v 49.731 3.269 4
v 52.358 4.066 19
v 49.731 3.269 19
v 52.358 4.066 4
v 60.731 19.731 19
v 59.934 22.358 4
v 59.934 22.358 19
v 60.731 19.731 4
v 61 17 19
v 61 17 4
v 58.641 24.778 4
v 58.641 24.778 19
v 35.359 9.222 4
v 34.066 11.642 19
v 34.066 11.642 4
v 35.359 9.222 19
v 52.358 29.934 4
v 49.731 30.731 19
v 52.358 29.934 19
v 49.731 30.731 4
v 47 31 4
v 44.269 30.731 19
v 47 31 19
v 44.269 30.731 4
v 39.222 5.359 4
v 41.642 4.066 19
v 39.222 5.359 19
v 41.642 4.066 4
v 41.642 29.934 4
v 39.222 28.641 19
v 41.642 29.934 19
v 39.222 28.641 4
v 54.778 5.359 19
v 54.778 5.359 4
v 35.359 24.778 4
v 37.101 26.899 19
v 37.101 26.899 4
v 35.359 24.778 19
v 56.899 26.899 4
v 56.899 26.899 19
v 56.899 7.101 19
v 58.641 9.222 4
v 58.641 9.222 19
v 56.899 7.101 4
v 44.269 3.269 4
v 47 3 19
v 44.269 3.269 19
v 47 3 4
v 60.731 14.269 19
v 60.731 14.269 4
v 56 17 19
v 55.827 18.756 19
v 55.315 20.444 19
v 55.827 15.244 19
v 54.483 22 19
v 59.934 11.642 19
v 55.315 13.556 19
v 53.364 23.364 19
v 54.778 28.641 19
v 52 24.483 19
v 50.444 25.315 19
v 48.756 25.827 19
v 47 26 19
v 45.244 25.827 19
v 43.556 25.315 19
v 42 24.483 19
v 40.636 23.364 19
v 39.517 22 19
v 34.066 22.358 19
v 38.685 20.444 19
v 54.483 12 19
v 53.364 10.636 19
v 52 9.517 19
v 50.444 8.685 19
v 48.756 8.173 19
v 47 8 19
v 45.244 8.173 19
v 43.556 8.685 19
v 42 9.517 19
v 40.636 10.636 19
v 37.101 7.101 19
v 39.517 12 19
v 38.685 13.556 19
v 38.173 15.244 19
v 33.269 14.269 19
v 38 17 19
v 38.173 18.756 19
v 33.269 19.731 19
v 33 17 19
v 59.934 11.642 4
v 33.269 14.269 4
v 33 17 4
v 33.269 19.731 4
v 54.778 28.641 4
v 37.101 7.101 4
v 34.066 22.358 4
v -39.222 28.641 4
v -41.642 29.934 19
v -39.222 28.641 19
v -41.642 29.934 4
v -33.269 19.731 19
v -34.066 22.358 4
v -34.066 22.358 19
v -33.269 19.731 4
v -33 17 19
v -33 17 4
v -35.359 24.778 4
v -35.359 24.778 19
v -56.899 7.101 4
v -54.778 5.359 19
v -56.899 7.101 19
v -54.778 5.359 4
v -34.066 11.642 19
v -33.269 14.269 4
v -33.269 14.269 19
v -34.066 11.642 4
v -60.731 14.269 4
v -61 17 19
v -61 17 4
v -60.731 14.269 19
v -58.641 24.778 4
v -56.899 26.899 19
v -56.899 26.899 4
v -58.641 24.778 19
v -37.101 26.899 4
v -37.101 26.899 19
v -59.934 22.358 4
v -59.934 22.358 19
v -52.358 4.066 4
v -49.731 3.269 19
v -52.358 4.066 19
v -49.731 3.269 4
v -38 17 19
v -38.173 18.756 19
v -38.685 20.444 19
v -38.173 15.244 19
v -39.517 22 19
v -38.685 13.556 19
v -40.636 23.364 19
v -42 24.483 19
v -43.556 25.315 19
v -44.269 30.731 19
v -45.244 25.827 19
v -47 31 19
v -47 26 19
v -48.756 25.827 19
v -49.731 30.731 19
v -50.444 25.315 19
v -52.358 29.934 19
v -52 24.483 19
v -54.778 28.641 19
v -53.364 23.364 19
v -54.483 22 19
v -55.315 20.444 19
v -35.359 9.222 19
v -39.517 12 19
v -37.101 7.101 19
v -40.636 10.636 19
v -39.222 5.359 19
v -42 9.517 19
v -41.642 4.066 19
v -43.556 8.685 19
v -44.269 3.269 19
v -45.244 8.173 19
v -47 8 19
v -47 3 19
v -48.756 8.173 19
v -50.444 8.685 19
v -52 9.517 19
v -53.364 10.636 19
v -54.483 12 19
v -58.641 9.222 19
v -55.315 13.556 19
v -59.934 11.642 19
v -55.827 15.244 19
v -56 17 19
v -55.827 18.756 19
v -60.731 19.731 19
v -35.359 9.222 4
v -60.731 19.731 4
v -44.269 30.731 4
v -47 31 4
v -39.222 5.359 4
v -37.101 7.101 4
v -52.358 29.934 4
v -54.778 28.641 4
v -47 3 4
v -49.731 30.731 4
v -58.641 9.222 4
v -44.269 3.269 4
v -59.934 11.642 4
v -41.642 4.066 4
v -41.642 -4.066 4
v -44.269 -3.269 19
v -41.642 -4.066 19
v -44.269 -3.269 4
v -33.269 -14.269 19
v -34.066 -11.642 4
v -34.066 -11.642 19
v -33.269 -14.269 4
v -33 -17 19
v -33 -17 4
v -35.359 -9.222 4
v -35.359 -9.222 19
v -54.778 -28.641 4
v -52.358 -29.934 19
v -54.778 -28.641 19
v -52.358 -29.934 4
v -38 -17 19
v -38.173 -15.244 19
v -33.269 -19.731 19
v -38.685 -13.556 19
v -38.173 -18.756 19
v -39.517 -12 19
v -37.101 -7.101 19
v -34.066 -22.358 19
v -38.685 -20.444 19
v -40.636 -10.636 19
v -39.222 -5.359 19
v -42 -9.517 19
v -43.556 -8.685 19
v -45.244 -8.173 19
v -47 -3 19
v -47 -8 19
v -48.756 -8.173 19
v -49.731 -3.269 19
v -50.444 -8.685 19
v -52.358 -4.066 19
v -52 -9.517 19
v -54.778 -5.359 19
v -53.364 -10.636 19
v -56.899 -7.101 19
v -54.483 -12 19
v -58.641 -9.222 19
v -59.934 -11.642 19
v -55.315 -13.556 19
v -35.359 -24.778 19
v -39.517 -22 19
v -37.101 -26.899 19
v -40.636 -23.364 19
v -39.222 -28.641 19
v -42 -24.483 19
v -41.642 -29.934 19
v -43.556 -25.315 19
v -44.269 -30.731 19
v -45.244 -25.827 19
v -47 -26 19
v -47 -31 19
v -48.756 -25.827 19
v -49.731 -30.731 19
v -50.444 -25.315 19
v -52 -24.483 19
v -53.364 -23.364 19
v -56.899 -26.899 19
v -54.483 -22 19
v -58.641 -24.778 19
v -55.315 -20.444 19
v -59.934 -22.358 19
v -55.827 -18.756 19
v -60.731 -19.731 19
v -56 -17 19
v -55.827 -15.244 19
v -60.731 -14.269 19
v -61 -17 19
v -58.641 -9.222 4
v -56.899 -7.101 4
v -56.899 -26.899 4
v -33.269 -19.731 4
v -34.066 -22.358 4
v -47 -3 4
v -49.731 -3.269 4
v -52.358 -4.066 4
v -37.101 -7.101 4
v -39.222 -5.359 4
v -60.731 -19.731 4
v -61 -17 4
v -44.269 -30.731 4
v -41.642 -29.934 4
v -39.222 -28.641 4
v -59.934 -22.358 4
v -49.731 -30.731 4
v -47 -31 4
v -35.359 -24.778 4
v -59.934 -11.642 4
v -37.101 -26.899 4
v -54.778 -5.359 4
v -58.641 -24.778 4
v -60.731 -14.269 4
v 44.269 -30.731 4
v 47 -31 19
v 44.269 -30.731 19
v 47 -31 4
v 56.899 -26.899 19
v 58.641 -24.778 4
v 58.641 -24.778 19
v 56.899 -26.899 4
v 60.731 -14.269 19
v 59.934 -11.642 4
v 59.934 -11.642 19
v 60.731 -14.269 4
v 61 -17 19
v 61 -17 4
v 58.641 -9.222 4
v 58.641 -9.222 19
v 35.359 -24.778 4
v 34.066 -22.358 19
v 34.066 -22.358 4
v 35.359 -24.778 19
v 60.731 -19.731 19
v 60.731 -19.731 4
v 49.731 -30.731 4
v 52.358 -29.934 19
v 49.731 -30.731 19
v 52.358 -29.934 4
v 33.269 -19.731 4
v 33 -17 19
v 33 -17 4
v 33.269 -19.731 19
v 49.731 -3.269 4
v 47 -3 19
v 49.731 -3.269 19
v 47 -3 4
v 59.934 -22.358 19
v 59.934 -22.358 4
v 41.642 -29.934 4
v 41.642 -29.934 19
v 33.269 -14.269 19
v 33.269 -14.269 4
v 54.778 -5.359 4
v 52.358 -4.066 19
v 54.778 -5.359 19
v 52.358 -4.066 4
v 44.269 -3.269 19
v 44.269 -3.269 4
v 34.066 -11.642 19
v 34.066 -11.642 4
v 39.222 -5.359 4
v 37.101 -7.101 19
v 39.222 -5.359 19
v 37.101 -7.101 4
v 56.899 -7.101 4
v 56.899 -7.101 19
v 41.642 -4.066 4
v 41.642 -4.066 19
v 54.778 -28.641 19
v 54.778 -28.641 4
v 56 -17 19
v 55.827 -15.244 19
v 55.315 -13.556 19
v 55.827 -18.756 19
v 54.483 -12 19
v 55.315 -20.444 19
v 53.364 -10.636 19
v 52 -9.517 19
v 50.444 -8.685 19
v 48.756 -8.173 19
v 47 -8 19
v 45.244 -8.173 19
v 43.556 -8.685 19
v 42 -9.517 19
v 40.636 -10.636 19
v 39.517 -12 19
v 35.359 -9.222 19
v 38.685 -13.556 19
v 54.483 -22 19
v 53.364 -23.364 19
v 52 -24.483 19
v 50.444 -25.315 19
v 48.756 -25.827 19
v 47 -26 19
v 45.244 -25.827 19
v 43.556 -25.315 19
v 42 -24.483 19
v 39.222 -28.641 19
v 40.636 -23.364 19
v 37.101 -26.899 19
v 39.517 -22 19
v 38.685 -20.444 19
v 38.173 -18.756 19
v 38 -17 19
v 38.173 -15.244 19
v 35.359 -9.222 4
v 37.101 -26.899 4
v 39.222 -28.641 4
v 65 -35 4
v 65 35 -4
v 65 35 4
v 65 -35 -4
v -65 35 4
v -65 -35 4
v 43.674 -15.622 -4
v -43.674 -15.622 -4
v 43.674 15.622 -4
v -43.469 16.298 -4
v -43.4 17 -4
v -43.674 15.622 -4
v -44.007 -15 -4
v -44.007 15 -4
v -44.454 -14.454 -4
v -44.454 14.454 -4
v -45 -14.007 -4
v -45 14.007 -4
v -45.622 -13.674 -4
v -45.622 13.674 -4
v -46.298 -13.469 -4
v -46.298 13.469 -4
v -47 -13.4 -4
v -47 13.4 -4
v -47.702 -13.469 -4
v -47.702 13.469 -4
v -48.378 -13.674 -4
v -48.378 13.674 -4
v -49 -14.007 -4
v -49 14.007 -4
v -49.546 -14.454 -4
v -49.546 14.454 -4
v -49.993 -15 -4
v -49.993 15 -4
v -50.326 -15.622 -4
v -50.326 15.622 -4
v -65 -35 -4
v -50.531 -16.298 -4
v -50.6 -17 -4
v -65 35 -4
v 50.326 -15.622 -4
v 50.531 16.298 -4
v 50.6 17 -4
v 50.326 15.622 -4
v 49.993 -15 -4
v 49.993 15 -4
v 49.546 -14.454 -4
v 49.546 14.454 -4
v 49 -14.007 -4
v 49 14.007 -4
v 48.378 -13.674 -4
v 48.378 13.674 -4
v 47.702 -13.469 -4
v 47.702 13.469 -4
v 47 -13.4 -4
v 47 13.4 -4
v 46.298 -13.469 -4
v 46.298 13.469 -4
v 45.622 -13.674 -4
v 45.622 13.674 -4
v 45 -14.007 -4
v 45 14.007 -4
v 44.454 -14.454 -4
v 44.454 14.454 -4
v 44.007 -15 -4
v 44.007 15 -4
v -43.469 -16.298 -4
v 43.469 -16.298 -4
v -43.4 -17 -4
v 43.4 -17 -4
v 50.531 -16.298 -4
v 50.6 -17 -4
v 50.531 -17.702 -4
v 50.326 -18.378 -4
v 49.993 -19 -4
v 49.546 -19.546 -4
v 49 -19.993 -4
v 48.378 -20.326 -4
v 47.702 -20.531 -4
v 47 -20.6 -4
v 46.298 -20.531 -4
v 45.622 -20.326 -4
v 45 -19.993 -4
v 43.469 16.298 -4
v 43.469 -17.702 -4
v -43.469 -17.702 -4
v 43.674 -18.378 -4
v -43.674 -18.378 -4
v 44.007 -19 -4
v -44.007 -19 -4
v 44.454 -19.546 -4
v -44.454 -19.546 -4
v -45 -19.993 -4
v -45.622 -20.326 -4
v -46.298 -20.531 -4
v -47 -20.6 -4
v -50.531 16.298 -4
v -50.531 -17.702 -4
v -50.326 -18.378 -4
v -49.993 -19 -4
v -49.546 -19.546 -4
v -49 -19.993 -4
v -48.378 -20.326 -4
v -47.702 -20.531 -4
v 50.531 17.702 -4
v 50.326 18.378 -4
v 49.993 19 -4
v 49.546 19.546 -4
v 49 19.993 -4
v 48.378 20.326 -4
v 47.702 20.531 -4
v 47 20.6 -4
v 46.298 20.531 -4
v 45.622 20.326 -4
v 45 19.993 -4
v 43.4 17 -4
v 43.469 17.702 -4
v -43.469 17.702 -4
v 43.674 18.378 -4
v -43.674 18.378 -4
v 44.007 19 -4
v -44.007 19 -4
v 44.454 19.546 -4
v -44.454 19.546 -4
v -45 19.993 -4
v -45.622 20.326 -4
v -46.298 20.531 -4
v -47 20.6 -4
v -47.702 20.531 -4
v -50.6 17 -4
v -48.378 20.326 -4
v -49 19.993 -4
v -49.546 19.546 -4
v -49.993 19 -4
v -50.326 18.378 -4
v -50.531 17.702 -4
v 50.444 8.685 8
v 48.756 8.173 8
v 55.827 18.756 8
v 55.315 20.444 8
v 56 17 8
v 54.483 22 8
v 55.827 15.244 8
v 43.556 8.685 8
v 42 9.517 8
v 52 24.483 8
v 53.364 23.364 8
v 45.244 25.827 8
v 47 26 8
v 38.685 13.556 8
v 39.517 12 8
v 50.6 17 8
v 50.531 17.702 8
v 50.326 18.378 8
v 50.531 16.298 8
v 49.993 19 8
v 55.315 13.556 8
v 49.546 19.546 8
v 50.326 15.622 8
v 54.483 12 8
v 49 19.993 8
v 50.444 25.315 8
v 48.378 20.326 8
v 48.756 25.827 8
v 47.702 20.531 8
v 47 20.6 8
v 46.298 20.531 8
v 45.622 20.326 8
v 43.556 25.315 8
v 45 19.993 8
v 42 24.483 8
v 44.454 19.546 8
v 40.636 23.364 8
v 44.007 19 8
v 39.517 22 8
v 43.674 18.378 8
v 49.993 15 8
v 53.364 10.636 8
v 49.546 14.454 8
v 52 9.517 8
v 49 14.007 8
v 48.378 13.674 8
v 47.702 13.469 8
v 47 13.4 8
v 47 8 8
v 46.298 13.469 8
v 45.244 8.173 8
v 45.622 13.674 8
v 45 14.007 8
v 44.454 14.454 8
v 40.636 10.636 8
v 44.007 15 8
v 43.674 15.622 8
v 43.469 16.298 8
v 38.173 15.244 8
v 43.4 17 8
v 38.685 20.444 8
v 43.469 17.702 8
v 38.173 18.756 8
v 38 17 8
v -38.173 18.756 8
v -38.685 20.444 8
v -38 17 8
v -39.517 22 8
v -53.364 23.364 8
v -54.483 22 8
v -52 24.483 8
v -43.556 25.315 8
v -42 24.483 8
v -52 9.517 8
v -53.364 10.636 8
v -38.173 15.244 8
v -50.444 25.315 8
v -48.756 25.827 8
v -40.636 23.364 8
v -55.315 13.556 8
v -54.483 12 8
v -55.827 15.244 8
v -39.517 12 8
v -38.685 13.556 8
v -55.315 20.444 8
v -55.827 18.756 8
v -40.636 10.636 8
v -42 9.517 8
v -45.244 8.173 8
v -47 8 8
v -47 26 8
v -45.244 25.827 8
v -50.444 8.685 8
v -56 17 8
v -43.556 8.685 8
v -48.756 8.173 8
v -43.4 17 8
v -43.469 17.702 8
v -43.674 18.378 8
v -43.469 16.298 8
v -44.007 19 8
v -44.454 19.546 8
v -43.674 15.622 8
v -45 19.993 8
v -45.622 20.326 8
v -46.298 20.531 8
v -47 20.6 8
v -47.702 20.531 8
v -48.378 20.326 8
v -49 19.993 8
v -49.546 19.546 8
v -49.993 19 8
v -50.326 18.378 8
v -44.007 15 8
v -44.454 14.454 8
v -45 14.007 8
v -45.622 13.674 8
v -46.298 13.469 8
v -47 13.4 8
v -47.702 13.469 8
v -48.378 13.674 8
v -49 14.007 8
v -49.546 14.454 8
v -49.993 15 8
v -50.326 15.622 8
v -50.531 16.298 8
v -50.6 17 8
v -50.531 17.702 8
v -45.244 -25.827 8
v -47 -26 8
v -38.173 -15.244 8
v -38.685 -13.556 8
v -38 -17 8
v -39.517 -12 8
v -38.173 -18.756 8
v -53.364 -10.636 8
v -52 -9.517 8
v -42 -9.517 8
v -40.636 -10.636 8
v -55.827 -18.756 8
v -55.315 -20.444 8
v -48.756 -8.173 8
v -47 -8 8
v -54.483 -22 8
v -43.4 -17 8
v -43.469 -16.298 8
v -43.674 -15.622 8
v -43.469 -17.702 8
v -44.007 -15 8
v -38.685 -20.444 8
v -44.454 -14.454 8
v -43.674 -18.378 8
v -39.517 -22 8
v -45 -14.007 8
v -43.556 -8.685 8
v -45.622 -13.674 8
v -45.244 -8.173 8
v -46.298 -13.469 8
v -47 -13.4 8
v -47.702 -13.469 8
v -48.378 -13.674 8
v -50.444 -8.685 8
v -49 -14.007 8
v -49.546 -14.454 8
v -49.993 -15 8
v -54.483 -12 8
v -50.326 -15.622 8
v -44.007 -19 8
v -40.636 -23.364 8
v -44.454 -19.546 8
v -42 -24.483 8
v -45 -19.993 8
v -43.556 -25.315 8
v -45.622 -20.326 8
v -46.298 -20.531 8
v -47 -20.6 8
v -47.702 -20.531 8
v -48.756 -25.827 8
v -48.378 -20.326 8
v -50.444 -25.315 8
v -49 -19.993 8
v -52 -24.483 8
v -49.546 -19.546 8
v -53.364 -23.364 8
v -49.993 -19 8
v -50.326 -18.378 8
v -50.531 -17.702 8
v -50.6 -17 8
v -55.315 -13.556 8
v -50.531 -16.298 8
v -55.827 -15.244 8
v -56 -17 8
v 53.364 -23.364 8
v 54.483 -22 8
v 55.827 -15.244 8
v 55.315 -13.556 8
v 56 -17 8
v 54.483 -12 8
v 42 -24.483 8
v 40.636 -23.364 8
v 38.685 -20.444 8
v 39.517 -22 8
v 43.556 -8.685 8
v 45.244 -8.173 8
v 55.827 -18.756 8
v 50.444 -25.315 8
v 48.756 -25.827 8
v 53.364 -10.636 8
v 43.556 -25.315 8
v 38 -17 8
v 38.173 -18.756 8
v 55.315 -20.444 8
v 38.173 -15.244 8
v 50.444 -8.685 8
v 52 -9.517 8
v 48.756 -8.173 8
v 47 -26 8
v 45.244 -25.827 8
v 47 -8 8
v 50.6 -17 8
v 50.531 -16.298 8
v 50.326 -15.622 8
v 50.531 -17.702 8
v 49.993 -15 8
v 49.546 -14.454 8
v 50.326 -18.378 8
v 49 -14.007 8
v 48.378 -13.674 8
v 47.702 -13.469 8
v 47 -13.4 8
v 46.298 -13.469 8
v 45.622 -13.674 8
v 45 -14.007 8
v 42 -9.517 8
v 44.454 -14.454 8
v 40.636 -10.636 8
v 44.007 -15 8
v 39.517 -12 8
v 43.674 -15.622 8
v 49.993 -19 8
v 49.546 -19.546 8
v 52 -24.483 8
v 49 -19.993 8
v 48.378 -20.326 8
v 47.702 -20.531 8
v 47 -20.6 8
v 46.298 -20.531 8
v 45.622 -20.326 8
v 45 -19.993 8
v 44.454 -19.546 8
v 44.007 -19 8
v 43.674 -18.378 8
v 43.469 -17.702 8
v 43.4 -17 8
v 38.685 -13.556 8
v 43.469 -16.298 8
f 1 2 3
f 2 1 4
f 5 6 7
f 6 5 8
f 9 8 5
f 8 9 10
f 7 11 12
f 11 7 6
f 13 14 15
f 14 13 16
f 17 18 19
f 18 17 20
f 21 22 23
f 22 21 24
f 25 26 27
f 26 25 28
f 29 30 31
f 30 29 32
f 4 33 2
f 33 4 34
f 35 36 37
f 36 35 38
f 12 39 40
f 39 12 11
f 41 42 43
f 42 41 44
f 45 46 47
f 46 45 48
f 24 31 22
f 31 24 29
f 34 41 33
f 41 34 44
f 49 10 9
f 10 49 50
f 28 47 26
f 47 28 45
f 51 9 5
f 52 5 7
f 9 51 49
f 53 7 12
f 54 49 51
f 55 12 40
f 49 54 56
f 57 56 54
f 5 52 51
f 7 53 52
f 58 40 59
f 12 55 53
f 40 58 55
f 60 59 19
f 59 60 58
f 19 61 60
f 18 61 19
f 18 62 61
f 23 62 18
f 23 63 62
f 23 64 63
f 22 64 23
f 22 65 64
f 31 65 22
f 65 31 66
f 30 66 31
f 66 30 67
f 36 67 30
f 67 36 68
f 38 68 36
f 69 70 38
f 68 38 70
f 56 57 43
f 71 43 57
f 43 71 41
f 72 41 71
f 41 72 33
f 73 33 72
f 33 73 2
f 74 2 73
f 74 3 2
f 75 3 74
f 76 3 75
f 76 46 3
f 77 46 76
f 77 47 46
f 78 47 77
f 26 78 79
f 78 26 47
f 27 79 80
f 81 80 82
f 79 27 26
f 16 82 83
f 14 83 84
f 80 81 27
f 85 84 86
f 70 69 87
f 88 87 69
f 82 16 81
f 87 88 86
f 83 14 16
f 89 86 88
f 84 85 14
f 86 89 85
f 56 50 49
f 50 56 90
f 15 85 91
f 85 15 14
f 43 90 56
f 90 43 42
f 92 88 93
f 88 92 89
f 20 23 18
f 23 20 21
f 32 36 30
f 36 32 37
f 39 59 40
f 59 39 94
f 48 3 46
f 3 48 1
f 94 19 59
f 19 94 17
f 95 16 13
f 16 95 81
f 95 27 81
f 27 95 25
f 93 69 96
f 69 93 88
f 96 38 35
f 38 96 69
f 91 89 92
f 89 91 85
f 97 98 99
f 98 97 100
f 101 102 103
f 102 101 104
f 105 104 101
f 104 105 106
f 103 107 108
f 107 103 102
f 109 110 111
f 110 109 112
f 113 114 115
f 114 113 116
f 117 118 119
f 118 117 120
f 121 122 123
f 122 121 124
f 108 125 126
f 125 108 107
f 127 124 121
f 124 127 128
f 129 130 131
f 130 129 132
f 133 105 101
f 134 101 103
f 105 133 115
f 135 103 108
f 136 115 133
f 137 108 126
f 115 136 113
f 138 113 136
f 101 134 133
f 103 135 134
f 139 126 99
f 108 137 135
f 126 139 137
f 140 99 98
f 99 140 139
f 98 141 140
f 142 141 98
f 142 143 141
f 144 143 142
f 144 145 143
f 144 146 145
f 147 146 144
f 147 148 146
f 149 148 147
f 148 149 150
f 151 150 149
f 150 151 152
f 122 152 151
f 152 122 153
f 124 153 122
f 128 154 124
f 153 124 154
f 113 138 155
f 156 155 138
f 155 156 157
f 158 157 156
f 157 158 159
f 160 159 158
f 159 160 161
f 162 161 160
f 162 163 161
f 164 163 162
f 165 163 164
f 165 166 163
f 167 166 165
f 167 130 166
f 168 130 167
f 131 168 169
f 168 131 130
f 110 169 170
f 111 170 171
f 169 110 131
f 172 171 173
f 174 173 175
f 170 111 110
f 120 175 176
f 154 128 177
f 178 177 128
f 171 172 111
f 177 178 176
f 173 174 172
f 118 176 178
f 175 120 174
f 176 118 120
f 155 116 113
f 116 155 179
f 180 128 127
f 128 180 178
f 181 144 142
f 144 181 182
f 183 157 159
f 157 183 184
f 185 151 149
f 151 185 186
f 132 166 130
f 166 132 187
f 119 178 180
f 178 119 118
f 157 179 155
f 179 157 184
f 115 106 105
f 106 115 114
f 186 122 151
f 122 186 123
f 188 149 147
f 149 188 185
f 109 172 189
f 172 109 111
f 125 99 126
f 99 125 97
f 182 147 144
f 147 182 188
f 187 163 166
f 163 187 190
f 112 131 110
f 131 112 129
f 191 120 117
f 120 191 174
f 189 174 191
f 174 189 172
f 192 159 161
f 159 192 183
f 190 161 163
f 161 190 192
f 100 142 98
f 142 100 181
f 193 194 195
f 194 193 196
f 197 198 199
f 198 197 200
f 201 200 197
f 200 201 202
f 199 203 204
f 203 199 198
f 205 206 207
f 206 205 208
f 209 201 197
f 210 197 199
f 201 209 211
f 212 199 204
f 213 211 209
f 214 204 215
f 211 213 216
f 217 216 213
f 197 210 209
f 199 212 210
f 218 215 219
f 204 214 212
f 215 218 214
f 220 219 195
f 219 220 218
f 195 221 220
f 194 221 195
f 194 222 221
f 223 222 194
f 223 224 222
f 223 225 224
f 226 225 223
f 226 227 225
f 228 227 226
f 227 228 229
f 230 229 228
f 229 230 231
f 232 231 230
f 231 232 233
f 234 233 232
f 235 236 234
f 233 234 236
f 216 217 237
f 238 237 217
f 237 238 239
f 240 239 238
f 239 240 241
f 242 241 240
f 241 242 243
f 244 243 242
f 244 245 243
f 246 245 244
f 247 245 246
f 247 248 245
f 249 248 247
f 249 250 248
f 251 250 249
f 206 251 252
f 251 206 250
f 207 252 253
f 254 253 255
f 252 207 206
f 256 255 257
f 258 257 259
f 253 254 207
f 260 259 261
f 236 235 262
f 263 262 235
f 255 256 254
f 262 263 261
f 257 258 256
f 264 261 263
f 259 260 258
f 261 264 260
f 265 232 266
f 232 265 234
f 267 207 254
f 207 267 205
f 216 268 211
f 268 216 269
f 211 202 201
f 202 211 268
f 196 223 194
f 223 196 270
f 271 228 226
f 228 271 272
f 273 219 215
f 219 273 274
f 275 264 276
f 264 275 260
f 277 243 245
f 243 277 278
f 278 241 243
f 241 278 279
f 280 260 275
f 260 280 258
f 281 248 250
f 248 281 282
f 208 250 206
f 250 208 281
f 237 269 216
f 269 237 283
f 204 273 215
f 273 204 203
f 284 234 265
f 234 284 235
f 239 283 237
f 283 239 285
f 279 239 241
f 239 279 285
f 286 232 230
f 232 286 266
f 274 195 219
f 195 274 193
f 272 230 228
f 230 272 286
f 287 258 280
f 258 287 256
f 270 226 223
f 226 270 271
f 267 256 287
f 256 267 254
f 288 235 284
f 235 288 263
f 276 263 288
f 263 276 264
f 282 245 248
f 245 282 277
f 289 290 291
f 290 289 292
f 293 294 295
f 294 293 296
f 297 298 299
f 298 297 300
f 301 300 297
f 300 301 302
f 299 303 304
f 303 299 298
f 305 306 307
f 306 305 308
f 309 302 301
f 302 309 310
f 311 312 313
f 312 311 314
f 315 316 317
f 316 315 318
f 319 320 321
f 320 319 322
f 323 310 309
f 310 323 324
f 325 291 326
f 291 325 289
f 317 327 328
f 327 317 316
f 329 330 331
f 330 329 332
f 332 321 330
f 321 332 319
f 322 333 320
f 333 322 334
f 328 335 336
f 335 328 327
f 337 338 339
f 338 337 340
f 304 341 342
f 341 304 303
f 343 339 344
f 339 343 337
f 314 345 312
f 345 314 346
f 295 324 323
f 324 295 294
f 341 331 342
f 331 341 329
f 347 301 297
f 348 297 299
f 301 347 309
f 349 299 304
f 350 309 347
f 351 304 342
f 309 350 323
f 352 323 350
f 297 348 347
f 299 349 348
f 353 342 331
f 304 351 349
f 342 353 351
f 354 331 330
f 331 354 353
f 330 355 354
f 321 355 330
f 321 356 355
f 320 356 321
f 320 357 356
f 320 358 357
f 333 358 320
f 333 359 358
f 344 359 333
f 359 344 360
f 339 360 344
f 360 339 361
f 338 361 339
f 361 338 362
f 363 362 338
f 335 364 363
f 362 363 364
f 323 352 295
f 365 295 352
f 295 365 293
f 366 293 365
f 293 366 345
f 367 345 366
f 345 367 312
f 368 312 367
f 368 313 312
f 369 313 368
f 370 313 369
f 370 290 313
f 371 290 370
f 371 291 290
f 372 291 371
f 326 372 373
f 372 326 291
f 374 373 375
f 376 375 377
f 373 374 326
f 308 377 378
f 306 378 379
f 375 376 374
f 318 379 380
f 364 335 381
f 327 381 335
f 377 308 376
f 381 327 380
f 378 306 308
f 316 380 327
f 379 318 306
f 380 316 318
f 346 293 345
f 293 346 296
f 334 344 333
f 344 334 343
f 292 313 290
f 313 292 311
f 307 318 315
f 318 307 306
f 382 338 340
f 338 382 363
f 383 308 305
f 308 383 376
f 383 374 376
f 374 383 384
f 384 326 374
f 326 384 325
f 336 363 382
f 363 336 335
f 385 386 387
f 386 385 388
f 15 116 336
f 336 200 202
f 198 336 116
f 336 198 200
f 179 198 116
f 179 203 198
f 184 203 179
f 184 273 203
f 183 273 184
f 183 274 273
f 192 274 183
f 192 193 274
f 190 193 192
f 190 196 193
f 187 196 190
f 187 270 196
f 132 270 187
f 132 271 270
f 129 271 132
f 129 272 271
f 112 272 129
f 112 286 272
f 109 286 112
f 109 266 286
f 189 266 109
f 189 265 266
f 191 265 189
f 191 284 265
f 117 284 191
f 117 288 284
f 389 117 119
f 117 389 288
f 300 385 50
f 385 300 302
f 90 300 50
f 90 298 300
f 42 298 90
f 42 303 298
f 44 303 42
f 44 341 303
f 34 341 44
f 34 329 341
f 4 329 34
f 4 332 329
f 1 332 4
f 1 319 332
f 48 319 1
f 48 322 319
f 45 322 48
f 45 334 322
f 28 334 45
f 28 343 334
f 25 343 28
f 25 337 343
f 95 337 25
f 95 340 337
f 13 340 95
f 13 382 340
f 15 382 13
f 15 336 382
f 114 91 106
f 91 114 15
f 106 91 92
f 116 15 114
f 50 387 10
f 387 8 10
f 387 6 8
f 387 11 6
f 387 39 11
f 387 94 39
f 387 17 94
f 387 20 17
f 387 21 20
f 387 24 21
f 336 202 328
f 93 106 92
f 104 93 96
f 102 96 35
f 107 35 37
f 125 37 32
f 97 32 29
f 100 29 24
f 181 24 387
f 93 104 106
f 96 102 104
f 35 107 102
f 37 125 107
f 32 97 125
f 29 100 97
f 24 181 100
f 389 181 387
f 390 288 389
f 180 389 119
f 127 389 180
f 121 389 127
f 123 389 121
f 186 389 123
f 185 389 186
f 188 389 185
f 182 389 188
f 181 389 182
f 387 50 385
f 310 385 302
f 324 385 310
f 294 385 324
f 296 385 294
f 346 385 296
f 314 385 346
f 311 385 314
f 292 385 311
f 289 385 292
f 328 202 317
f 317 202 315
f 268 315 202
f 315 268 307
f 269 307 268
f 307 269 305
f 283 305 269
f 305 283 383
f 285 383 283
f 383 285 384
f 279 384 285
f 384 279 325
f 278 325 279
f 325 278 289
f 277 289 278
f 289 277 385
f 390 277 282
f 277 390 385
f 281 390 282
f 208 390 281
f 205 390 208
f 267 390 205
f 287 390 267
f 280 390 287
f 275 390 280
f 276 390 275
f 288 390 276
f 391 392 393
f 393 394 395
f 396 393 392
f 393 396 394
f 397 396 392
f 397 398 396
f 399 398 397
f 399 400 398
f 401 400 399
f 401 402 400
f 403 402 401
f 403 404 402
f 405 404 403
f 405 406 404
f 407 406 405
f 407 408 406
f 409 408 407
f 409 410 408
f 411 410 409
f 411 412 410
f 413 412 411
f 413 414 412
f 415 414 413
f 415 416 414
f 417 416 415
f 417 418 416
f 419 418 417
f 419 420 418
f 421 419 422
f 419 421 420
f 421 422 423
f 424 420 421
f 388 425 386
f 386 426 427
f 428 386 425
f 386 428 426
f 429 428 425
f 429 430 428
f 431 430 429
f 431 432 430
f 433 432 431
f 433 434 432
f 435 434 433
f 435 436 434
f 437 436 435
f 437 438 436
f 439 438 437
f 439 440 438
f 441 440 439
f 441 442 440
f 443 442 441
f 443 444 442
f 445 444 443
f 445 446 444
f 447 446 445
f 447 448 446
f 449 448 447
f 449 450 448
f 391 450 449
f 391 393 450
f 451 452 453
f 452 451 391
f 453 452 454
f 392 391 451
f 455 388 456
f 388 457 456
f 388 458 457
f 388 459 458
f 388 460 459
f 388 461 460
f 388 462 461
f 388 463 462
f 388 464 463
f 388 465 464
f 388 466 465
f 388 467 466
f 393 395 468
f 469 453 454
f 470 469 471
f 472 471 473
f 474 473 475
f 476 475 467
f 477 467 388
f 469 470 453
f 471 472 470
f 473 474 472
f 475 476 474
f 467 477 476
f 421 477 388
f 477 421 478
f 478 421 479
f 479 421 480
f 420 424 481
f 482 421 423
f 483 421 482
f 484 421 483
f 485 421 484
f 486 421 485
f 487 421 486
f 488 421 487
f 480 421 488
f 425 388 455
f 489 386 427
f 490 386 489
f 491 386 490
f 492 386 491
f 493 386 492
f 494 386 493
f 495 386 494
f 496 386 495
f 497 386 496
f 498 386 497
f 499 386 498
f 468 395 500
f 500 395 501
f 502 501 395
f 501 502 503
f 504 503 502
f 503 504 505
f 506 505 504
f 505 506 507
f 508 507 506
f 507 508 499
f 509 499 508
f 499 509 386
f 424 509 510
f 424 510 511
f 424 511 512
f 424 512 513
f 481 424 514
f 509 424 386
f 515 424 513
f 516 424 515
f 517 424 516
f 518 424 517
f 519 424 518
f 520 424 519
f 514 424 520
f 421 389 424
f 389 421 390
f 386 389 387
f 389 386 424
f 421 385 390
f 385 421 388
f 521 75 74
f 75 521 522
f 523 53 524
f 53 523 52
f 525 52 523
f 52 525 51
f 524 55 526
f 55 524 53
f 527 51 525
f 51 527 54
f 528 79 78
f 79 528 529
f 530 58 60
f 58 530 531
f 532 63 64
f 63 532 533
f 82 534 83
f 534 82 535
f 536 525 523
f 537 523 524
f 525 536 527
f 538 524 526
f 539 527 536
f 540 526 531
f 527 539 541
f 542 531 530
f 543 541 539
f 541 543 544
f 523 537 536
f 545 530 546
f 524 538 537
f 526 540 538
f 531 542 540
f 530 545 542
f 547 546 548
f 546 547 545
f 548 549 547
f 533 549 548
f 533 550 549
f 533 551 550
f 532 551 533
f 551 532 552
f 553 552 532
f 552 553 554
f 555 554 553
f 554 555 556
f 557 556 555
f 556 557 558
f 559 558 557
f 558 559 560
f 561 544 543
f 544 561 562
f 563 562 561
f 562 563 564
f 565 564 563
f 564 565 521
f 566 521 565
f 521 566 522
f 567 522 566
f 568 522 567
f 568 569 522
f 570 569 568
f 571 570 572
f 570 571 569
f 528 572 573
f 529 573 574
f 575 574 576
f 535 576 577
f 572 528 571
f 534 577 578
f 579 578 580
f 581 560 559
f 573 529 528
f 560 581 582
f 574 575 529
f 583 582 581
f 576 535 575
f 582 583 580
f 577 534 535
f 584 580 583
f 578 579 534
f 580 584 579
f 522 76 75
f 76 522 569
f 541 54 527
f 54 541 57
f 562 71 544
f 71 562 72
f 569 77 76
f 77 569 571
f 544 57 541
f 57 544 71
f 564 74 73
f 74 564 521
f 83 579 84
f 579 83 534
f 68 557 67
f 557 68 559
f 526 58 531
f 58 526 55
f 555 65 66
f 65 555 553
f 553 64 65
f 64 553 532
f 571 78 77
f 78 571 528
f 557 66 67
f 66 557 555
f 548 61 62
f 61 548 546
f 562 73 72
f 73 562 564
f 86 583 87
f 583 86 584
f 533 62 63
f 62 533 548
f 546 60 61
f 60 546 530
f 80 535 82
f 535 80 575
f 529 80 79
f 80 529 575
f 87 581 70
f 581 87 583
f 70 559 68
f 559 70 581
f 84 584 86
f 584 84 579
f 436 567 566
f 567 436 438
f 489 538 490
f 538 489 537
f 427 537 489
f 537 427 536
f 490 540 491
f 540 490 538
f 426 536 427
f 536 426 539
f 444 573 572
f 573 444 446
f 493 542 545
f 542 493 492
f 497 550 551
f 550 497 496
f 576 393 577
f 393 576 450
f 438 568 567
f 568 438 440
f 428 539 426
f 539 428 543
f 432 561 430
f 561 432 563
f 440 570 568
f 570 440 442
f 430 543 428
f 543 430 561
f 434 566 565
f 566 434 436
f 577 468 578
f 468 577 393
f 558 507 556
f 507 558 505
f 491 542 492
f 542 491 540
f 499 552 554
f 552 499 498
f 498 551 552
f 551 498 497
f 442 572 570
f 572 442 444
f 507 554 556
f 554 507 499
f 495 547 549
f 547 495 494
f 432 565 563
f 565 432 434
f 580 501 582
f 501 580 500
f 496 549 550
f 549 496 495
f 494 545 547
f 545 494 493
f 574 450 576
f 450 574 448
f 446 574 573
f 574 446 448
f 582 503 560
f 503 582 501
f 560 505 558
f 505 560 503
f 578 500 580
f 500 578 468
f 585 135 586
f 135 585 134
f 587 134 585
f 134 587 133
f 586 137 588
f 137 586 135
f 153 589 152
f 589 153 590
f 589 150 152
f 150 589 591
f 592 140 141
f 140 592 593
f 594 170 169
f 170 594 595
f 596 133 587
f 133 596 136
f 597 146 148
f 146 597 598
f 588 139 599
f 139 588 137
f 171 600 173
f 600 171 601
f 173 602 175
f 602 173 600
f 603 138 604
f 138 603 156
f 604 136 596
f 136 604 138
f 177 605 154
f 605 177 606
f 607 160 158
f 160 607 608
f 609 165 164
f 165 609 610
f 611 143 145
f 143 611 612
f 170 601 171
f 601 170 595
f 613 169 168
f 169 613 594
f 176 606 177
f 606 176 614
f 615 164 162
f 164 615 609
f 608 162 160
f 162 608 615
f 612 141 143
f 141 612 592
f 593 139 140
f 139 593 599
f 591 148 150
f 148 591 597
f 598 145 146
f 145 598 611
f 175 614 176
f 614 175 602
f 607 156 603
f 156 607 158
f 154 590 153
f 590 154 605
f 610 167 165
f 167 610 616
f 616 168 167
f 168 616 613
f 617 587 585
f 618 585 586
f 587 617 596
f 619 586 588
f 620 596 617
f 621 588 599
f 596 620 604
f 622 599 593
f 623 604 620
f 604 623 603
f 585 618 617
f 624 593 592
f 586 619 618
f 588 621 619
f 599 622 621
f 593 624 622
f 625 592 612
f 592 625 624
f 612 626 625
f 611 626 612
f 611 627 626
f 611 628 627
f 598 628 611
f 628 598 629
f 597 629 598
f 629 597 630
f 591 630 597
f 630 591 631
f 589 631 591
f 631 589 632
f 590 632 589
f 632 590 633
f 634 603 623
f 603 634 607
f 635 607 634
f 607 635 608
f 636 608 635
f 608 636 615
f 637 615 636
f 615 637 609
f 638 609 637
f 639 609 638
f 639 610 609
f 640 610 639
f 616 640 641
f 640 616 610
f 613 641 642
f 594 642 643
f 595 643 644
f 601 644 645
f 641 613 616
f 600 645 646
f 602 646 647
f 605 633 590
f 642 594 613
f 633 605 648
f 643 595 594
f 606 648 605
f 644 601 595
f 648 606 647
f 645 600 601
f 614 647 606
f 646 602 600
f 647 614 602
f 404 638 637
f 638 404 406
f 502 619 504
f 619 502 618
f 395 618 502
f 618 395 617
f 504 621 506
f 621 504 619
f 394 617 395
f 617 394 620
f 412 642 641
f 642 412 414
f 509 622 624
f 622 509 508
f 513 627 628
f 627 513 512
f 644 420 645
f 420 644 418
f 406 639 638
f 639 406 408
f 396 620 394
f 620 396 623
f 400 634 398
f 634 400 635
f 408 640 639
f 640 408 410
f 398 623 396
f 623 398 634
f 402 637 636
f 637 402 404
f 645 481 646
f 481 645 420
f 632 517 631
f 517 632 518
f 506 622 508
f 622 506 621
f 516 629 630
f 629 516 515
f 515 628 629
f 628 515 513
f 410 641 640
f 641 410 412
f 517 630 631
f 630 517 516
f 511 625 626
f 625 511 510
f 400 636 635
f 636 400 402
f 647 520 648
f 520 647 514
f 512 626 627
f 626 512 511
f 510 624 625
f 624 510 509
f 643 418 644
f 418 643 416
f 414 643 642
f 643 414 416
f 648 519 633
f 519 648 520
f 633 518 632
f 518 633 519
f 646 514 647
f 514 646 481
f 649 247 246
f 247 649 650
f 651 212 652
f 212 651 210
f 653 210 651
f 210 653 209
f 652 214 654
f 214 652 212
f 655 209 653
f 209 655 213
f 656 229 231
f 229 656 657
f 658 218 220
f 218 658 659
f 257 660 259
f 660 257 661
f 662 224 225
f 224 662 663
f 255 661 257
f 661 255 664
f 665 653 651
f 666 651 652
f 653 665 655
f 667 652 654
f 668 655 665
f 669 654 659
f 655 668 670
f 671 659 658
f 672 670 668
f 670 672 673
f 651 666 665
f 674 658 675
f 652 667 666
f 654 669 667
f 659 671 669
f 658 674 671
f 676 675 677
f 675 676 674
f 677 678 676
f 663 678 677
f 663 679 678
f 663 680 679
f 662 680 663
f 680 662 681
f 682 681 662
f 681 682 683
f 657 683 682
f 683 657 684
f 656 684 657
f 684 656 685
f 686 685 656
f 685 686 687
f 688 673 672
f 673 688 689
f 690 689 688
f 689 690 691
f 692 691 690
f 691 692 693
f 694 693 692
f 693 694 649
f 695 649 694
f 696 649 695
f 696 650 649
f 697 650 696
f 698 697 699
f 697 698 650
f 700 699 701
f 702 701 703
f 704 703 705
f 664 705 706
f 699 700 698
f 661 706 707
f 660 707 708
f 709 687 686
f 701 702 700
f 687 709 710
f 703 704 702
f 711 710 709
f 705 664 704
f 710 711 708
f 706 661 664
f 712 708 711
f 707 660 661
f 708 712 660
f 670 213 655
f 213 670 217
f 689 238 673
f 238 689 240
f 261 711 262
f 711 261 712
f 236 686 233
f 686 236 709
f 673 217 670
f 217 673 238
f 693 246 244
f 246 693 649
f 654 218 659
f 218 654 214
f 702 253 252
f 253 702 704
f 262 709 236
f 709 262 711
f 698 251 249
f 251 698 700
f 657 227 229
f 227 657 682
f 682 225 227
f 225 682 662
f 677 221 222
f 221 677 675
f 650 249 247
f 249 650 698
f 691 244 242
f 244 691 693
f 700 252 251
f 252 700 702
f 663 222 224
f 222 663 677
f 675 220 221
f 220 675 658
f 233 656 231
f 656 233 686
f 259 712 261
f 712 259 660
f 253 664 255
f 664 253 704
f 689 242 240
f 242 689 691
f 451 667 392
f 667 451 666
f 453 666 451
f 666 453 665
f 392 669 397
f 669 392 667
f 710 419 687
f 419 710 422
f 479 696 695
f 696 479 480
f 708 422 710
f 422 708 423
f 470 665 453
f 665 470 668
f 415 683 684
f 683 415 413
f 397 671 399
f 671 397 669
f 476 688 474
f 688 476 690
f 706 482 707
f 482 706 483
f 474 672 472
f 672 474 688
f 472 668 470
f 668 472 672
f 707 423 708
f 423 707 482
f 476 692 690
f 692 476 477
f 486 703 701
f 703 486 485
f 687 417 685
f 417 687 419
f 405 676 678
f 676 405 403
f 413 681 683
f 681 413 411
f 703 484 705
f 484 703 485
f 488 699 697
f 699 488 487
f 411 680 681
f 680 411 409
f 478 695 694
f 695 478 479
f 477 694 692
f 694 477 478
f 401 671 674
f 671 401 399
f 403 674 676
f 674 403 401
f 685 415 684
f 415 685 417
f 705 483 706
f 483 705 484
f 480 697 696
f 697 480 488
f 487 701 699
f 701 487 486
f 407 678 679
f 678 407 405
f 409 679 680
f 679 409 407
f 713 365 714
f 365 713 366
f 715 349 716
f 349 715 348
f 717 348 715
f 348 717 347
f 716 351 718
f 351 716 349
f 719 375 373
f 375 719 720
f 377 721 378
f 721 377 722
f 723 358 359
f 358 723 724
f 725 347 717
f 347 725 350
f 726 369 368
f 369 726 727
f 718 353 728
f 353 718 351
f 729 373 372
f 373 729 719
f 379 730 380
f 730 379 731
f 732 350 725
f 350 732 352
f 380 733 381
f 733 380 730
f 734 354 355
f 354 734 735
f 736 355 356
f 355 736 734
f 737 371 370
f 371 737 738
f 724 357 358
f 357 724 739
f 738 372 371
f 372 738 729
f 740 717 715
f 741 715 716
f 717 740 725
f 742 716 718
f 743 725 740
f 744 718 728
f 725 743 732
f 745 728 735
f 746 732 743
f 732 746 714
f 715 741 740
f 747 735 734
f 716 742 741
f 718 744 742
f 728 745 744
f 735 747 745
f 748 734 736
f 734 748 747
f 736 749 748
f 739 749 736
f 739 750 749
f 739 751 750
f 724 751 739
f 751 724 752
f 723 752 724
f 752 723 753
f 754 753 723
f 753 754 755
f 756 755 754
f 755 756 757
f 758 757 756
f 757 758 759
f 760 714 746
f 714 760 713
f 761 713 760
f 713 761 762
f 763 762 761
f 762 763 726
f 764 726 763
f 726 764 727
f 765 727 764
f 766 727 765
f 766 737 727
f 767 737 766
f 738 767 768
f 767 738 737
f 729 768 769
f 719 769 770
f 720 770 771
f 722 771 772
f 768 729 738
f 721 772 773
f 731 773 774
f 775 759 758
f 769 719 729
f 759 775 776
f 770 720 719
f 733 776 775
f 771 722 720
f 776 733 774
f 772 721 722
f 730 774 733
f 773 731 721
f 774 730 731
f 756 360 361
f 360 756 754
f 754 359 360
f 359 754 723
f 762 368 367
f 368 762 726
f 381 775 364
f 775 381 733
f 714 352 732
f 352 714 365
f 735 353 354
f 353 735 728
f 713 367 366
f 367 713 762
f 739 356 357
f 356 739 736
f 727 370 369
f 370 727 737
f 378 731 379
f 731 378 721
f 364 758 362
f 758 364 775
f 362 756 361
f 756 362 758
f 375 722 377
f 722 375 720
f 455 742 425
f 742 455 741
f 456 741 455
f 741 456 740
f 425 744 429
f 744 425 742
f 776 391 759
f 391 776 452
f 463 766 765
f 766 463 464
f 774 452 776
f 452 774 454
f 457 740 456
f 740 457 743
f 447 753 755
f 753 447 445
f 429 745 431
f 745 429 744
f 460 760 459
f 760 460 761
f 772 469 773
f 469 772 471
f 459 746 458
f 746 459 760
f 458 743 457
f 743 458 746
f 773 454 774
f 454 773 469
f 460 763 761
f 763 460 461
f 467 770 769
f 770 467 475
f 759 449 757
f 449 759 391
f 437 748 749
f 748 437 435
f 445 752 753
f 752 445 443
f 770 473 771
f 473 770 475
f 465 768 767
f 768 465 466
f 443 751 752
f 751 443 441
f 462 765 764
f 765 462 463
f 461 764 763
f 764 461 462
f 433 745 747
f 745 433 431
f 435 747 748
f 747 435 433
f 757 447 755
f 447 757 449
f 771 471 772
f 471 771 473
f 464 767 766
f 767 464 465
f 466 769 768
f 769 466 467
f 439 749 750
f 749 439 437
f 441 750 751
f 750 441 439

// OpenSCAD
$fn = 32;

// ----------------------------------------------------------------------
// Socket pad plate
// bosses with counterbored sockets for the screws
// ----------------------------------------------------------------------

// --- parameters (mm) ---
base_t = 8;            // base plate thickness
boss_h = 15;           // boss height above the base plate
boss_d = 28;           // boss diameter
socket_d = 18;         // socket diameter
socket_depth = 11;     // socket depth from the boss face
bolt_d = 7.2;          // screw clearance hole through the socket floor
plate = [130, 70, 8];  // overall size (x, y, z)
edge = 18;             // boss centre offset from the plate edge
pads = 4;              // boss count, one per corner

// --- derived feature positions (mm) ---
height = base_t + boss_h;        // = 23   overall height of the part
corner_x = plate[0] / 2 - edge;  // = 47   boss centre X
corner_y = plate[1] / 2 - edge;  // = 17   boss centre Y
feature_centers = [
  [corner_x, corner_y],
  [-corner_x, corner_y],
  [-corner_x, -corner_y],
  [corner_x, -corner_y]
];   // boss centres: sockets, holes and the pads themselves are placed from here

// base plate, bosses on feature_centers, socket + through hole in each
difference() {
  union() {
    cube(plate, center = true);
    for (centre = feature_centers)
      translate([centre[0], centre[1], plate[2] / 2 - 1])
        cylinder(d = boss_d, h = boss_h + 1);
  }
  for (centre = feature_centers) {
    translate([centre[0], centre[1], plate[2] / 2 + boss_h - socket_depth])
      cylinder(d = socket_d, h = socket_depth + 1);
    translate([centre[0], centre[1], -height])
      cylinder(d = bolt_d, h = 2 * height + 2);  // through the socket floor
  }
}
